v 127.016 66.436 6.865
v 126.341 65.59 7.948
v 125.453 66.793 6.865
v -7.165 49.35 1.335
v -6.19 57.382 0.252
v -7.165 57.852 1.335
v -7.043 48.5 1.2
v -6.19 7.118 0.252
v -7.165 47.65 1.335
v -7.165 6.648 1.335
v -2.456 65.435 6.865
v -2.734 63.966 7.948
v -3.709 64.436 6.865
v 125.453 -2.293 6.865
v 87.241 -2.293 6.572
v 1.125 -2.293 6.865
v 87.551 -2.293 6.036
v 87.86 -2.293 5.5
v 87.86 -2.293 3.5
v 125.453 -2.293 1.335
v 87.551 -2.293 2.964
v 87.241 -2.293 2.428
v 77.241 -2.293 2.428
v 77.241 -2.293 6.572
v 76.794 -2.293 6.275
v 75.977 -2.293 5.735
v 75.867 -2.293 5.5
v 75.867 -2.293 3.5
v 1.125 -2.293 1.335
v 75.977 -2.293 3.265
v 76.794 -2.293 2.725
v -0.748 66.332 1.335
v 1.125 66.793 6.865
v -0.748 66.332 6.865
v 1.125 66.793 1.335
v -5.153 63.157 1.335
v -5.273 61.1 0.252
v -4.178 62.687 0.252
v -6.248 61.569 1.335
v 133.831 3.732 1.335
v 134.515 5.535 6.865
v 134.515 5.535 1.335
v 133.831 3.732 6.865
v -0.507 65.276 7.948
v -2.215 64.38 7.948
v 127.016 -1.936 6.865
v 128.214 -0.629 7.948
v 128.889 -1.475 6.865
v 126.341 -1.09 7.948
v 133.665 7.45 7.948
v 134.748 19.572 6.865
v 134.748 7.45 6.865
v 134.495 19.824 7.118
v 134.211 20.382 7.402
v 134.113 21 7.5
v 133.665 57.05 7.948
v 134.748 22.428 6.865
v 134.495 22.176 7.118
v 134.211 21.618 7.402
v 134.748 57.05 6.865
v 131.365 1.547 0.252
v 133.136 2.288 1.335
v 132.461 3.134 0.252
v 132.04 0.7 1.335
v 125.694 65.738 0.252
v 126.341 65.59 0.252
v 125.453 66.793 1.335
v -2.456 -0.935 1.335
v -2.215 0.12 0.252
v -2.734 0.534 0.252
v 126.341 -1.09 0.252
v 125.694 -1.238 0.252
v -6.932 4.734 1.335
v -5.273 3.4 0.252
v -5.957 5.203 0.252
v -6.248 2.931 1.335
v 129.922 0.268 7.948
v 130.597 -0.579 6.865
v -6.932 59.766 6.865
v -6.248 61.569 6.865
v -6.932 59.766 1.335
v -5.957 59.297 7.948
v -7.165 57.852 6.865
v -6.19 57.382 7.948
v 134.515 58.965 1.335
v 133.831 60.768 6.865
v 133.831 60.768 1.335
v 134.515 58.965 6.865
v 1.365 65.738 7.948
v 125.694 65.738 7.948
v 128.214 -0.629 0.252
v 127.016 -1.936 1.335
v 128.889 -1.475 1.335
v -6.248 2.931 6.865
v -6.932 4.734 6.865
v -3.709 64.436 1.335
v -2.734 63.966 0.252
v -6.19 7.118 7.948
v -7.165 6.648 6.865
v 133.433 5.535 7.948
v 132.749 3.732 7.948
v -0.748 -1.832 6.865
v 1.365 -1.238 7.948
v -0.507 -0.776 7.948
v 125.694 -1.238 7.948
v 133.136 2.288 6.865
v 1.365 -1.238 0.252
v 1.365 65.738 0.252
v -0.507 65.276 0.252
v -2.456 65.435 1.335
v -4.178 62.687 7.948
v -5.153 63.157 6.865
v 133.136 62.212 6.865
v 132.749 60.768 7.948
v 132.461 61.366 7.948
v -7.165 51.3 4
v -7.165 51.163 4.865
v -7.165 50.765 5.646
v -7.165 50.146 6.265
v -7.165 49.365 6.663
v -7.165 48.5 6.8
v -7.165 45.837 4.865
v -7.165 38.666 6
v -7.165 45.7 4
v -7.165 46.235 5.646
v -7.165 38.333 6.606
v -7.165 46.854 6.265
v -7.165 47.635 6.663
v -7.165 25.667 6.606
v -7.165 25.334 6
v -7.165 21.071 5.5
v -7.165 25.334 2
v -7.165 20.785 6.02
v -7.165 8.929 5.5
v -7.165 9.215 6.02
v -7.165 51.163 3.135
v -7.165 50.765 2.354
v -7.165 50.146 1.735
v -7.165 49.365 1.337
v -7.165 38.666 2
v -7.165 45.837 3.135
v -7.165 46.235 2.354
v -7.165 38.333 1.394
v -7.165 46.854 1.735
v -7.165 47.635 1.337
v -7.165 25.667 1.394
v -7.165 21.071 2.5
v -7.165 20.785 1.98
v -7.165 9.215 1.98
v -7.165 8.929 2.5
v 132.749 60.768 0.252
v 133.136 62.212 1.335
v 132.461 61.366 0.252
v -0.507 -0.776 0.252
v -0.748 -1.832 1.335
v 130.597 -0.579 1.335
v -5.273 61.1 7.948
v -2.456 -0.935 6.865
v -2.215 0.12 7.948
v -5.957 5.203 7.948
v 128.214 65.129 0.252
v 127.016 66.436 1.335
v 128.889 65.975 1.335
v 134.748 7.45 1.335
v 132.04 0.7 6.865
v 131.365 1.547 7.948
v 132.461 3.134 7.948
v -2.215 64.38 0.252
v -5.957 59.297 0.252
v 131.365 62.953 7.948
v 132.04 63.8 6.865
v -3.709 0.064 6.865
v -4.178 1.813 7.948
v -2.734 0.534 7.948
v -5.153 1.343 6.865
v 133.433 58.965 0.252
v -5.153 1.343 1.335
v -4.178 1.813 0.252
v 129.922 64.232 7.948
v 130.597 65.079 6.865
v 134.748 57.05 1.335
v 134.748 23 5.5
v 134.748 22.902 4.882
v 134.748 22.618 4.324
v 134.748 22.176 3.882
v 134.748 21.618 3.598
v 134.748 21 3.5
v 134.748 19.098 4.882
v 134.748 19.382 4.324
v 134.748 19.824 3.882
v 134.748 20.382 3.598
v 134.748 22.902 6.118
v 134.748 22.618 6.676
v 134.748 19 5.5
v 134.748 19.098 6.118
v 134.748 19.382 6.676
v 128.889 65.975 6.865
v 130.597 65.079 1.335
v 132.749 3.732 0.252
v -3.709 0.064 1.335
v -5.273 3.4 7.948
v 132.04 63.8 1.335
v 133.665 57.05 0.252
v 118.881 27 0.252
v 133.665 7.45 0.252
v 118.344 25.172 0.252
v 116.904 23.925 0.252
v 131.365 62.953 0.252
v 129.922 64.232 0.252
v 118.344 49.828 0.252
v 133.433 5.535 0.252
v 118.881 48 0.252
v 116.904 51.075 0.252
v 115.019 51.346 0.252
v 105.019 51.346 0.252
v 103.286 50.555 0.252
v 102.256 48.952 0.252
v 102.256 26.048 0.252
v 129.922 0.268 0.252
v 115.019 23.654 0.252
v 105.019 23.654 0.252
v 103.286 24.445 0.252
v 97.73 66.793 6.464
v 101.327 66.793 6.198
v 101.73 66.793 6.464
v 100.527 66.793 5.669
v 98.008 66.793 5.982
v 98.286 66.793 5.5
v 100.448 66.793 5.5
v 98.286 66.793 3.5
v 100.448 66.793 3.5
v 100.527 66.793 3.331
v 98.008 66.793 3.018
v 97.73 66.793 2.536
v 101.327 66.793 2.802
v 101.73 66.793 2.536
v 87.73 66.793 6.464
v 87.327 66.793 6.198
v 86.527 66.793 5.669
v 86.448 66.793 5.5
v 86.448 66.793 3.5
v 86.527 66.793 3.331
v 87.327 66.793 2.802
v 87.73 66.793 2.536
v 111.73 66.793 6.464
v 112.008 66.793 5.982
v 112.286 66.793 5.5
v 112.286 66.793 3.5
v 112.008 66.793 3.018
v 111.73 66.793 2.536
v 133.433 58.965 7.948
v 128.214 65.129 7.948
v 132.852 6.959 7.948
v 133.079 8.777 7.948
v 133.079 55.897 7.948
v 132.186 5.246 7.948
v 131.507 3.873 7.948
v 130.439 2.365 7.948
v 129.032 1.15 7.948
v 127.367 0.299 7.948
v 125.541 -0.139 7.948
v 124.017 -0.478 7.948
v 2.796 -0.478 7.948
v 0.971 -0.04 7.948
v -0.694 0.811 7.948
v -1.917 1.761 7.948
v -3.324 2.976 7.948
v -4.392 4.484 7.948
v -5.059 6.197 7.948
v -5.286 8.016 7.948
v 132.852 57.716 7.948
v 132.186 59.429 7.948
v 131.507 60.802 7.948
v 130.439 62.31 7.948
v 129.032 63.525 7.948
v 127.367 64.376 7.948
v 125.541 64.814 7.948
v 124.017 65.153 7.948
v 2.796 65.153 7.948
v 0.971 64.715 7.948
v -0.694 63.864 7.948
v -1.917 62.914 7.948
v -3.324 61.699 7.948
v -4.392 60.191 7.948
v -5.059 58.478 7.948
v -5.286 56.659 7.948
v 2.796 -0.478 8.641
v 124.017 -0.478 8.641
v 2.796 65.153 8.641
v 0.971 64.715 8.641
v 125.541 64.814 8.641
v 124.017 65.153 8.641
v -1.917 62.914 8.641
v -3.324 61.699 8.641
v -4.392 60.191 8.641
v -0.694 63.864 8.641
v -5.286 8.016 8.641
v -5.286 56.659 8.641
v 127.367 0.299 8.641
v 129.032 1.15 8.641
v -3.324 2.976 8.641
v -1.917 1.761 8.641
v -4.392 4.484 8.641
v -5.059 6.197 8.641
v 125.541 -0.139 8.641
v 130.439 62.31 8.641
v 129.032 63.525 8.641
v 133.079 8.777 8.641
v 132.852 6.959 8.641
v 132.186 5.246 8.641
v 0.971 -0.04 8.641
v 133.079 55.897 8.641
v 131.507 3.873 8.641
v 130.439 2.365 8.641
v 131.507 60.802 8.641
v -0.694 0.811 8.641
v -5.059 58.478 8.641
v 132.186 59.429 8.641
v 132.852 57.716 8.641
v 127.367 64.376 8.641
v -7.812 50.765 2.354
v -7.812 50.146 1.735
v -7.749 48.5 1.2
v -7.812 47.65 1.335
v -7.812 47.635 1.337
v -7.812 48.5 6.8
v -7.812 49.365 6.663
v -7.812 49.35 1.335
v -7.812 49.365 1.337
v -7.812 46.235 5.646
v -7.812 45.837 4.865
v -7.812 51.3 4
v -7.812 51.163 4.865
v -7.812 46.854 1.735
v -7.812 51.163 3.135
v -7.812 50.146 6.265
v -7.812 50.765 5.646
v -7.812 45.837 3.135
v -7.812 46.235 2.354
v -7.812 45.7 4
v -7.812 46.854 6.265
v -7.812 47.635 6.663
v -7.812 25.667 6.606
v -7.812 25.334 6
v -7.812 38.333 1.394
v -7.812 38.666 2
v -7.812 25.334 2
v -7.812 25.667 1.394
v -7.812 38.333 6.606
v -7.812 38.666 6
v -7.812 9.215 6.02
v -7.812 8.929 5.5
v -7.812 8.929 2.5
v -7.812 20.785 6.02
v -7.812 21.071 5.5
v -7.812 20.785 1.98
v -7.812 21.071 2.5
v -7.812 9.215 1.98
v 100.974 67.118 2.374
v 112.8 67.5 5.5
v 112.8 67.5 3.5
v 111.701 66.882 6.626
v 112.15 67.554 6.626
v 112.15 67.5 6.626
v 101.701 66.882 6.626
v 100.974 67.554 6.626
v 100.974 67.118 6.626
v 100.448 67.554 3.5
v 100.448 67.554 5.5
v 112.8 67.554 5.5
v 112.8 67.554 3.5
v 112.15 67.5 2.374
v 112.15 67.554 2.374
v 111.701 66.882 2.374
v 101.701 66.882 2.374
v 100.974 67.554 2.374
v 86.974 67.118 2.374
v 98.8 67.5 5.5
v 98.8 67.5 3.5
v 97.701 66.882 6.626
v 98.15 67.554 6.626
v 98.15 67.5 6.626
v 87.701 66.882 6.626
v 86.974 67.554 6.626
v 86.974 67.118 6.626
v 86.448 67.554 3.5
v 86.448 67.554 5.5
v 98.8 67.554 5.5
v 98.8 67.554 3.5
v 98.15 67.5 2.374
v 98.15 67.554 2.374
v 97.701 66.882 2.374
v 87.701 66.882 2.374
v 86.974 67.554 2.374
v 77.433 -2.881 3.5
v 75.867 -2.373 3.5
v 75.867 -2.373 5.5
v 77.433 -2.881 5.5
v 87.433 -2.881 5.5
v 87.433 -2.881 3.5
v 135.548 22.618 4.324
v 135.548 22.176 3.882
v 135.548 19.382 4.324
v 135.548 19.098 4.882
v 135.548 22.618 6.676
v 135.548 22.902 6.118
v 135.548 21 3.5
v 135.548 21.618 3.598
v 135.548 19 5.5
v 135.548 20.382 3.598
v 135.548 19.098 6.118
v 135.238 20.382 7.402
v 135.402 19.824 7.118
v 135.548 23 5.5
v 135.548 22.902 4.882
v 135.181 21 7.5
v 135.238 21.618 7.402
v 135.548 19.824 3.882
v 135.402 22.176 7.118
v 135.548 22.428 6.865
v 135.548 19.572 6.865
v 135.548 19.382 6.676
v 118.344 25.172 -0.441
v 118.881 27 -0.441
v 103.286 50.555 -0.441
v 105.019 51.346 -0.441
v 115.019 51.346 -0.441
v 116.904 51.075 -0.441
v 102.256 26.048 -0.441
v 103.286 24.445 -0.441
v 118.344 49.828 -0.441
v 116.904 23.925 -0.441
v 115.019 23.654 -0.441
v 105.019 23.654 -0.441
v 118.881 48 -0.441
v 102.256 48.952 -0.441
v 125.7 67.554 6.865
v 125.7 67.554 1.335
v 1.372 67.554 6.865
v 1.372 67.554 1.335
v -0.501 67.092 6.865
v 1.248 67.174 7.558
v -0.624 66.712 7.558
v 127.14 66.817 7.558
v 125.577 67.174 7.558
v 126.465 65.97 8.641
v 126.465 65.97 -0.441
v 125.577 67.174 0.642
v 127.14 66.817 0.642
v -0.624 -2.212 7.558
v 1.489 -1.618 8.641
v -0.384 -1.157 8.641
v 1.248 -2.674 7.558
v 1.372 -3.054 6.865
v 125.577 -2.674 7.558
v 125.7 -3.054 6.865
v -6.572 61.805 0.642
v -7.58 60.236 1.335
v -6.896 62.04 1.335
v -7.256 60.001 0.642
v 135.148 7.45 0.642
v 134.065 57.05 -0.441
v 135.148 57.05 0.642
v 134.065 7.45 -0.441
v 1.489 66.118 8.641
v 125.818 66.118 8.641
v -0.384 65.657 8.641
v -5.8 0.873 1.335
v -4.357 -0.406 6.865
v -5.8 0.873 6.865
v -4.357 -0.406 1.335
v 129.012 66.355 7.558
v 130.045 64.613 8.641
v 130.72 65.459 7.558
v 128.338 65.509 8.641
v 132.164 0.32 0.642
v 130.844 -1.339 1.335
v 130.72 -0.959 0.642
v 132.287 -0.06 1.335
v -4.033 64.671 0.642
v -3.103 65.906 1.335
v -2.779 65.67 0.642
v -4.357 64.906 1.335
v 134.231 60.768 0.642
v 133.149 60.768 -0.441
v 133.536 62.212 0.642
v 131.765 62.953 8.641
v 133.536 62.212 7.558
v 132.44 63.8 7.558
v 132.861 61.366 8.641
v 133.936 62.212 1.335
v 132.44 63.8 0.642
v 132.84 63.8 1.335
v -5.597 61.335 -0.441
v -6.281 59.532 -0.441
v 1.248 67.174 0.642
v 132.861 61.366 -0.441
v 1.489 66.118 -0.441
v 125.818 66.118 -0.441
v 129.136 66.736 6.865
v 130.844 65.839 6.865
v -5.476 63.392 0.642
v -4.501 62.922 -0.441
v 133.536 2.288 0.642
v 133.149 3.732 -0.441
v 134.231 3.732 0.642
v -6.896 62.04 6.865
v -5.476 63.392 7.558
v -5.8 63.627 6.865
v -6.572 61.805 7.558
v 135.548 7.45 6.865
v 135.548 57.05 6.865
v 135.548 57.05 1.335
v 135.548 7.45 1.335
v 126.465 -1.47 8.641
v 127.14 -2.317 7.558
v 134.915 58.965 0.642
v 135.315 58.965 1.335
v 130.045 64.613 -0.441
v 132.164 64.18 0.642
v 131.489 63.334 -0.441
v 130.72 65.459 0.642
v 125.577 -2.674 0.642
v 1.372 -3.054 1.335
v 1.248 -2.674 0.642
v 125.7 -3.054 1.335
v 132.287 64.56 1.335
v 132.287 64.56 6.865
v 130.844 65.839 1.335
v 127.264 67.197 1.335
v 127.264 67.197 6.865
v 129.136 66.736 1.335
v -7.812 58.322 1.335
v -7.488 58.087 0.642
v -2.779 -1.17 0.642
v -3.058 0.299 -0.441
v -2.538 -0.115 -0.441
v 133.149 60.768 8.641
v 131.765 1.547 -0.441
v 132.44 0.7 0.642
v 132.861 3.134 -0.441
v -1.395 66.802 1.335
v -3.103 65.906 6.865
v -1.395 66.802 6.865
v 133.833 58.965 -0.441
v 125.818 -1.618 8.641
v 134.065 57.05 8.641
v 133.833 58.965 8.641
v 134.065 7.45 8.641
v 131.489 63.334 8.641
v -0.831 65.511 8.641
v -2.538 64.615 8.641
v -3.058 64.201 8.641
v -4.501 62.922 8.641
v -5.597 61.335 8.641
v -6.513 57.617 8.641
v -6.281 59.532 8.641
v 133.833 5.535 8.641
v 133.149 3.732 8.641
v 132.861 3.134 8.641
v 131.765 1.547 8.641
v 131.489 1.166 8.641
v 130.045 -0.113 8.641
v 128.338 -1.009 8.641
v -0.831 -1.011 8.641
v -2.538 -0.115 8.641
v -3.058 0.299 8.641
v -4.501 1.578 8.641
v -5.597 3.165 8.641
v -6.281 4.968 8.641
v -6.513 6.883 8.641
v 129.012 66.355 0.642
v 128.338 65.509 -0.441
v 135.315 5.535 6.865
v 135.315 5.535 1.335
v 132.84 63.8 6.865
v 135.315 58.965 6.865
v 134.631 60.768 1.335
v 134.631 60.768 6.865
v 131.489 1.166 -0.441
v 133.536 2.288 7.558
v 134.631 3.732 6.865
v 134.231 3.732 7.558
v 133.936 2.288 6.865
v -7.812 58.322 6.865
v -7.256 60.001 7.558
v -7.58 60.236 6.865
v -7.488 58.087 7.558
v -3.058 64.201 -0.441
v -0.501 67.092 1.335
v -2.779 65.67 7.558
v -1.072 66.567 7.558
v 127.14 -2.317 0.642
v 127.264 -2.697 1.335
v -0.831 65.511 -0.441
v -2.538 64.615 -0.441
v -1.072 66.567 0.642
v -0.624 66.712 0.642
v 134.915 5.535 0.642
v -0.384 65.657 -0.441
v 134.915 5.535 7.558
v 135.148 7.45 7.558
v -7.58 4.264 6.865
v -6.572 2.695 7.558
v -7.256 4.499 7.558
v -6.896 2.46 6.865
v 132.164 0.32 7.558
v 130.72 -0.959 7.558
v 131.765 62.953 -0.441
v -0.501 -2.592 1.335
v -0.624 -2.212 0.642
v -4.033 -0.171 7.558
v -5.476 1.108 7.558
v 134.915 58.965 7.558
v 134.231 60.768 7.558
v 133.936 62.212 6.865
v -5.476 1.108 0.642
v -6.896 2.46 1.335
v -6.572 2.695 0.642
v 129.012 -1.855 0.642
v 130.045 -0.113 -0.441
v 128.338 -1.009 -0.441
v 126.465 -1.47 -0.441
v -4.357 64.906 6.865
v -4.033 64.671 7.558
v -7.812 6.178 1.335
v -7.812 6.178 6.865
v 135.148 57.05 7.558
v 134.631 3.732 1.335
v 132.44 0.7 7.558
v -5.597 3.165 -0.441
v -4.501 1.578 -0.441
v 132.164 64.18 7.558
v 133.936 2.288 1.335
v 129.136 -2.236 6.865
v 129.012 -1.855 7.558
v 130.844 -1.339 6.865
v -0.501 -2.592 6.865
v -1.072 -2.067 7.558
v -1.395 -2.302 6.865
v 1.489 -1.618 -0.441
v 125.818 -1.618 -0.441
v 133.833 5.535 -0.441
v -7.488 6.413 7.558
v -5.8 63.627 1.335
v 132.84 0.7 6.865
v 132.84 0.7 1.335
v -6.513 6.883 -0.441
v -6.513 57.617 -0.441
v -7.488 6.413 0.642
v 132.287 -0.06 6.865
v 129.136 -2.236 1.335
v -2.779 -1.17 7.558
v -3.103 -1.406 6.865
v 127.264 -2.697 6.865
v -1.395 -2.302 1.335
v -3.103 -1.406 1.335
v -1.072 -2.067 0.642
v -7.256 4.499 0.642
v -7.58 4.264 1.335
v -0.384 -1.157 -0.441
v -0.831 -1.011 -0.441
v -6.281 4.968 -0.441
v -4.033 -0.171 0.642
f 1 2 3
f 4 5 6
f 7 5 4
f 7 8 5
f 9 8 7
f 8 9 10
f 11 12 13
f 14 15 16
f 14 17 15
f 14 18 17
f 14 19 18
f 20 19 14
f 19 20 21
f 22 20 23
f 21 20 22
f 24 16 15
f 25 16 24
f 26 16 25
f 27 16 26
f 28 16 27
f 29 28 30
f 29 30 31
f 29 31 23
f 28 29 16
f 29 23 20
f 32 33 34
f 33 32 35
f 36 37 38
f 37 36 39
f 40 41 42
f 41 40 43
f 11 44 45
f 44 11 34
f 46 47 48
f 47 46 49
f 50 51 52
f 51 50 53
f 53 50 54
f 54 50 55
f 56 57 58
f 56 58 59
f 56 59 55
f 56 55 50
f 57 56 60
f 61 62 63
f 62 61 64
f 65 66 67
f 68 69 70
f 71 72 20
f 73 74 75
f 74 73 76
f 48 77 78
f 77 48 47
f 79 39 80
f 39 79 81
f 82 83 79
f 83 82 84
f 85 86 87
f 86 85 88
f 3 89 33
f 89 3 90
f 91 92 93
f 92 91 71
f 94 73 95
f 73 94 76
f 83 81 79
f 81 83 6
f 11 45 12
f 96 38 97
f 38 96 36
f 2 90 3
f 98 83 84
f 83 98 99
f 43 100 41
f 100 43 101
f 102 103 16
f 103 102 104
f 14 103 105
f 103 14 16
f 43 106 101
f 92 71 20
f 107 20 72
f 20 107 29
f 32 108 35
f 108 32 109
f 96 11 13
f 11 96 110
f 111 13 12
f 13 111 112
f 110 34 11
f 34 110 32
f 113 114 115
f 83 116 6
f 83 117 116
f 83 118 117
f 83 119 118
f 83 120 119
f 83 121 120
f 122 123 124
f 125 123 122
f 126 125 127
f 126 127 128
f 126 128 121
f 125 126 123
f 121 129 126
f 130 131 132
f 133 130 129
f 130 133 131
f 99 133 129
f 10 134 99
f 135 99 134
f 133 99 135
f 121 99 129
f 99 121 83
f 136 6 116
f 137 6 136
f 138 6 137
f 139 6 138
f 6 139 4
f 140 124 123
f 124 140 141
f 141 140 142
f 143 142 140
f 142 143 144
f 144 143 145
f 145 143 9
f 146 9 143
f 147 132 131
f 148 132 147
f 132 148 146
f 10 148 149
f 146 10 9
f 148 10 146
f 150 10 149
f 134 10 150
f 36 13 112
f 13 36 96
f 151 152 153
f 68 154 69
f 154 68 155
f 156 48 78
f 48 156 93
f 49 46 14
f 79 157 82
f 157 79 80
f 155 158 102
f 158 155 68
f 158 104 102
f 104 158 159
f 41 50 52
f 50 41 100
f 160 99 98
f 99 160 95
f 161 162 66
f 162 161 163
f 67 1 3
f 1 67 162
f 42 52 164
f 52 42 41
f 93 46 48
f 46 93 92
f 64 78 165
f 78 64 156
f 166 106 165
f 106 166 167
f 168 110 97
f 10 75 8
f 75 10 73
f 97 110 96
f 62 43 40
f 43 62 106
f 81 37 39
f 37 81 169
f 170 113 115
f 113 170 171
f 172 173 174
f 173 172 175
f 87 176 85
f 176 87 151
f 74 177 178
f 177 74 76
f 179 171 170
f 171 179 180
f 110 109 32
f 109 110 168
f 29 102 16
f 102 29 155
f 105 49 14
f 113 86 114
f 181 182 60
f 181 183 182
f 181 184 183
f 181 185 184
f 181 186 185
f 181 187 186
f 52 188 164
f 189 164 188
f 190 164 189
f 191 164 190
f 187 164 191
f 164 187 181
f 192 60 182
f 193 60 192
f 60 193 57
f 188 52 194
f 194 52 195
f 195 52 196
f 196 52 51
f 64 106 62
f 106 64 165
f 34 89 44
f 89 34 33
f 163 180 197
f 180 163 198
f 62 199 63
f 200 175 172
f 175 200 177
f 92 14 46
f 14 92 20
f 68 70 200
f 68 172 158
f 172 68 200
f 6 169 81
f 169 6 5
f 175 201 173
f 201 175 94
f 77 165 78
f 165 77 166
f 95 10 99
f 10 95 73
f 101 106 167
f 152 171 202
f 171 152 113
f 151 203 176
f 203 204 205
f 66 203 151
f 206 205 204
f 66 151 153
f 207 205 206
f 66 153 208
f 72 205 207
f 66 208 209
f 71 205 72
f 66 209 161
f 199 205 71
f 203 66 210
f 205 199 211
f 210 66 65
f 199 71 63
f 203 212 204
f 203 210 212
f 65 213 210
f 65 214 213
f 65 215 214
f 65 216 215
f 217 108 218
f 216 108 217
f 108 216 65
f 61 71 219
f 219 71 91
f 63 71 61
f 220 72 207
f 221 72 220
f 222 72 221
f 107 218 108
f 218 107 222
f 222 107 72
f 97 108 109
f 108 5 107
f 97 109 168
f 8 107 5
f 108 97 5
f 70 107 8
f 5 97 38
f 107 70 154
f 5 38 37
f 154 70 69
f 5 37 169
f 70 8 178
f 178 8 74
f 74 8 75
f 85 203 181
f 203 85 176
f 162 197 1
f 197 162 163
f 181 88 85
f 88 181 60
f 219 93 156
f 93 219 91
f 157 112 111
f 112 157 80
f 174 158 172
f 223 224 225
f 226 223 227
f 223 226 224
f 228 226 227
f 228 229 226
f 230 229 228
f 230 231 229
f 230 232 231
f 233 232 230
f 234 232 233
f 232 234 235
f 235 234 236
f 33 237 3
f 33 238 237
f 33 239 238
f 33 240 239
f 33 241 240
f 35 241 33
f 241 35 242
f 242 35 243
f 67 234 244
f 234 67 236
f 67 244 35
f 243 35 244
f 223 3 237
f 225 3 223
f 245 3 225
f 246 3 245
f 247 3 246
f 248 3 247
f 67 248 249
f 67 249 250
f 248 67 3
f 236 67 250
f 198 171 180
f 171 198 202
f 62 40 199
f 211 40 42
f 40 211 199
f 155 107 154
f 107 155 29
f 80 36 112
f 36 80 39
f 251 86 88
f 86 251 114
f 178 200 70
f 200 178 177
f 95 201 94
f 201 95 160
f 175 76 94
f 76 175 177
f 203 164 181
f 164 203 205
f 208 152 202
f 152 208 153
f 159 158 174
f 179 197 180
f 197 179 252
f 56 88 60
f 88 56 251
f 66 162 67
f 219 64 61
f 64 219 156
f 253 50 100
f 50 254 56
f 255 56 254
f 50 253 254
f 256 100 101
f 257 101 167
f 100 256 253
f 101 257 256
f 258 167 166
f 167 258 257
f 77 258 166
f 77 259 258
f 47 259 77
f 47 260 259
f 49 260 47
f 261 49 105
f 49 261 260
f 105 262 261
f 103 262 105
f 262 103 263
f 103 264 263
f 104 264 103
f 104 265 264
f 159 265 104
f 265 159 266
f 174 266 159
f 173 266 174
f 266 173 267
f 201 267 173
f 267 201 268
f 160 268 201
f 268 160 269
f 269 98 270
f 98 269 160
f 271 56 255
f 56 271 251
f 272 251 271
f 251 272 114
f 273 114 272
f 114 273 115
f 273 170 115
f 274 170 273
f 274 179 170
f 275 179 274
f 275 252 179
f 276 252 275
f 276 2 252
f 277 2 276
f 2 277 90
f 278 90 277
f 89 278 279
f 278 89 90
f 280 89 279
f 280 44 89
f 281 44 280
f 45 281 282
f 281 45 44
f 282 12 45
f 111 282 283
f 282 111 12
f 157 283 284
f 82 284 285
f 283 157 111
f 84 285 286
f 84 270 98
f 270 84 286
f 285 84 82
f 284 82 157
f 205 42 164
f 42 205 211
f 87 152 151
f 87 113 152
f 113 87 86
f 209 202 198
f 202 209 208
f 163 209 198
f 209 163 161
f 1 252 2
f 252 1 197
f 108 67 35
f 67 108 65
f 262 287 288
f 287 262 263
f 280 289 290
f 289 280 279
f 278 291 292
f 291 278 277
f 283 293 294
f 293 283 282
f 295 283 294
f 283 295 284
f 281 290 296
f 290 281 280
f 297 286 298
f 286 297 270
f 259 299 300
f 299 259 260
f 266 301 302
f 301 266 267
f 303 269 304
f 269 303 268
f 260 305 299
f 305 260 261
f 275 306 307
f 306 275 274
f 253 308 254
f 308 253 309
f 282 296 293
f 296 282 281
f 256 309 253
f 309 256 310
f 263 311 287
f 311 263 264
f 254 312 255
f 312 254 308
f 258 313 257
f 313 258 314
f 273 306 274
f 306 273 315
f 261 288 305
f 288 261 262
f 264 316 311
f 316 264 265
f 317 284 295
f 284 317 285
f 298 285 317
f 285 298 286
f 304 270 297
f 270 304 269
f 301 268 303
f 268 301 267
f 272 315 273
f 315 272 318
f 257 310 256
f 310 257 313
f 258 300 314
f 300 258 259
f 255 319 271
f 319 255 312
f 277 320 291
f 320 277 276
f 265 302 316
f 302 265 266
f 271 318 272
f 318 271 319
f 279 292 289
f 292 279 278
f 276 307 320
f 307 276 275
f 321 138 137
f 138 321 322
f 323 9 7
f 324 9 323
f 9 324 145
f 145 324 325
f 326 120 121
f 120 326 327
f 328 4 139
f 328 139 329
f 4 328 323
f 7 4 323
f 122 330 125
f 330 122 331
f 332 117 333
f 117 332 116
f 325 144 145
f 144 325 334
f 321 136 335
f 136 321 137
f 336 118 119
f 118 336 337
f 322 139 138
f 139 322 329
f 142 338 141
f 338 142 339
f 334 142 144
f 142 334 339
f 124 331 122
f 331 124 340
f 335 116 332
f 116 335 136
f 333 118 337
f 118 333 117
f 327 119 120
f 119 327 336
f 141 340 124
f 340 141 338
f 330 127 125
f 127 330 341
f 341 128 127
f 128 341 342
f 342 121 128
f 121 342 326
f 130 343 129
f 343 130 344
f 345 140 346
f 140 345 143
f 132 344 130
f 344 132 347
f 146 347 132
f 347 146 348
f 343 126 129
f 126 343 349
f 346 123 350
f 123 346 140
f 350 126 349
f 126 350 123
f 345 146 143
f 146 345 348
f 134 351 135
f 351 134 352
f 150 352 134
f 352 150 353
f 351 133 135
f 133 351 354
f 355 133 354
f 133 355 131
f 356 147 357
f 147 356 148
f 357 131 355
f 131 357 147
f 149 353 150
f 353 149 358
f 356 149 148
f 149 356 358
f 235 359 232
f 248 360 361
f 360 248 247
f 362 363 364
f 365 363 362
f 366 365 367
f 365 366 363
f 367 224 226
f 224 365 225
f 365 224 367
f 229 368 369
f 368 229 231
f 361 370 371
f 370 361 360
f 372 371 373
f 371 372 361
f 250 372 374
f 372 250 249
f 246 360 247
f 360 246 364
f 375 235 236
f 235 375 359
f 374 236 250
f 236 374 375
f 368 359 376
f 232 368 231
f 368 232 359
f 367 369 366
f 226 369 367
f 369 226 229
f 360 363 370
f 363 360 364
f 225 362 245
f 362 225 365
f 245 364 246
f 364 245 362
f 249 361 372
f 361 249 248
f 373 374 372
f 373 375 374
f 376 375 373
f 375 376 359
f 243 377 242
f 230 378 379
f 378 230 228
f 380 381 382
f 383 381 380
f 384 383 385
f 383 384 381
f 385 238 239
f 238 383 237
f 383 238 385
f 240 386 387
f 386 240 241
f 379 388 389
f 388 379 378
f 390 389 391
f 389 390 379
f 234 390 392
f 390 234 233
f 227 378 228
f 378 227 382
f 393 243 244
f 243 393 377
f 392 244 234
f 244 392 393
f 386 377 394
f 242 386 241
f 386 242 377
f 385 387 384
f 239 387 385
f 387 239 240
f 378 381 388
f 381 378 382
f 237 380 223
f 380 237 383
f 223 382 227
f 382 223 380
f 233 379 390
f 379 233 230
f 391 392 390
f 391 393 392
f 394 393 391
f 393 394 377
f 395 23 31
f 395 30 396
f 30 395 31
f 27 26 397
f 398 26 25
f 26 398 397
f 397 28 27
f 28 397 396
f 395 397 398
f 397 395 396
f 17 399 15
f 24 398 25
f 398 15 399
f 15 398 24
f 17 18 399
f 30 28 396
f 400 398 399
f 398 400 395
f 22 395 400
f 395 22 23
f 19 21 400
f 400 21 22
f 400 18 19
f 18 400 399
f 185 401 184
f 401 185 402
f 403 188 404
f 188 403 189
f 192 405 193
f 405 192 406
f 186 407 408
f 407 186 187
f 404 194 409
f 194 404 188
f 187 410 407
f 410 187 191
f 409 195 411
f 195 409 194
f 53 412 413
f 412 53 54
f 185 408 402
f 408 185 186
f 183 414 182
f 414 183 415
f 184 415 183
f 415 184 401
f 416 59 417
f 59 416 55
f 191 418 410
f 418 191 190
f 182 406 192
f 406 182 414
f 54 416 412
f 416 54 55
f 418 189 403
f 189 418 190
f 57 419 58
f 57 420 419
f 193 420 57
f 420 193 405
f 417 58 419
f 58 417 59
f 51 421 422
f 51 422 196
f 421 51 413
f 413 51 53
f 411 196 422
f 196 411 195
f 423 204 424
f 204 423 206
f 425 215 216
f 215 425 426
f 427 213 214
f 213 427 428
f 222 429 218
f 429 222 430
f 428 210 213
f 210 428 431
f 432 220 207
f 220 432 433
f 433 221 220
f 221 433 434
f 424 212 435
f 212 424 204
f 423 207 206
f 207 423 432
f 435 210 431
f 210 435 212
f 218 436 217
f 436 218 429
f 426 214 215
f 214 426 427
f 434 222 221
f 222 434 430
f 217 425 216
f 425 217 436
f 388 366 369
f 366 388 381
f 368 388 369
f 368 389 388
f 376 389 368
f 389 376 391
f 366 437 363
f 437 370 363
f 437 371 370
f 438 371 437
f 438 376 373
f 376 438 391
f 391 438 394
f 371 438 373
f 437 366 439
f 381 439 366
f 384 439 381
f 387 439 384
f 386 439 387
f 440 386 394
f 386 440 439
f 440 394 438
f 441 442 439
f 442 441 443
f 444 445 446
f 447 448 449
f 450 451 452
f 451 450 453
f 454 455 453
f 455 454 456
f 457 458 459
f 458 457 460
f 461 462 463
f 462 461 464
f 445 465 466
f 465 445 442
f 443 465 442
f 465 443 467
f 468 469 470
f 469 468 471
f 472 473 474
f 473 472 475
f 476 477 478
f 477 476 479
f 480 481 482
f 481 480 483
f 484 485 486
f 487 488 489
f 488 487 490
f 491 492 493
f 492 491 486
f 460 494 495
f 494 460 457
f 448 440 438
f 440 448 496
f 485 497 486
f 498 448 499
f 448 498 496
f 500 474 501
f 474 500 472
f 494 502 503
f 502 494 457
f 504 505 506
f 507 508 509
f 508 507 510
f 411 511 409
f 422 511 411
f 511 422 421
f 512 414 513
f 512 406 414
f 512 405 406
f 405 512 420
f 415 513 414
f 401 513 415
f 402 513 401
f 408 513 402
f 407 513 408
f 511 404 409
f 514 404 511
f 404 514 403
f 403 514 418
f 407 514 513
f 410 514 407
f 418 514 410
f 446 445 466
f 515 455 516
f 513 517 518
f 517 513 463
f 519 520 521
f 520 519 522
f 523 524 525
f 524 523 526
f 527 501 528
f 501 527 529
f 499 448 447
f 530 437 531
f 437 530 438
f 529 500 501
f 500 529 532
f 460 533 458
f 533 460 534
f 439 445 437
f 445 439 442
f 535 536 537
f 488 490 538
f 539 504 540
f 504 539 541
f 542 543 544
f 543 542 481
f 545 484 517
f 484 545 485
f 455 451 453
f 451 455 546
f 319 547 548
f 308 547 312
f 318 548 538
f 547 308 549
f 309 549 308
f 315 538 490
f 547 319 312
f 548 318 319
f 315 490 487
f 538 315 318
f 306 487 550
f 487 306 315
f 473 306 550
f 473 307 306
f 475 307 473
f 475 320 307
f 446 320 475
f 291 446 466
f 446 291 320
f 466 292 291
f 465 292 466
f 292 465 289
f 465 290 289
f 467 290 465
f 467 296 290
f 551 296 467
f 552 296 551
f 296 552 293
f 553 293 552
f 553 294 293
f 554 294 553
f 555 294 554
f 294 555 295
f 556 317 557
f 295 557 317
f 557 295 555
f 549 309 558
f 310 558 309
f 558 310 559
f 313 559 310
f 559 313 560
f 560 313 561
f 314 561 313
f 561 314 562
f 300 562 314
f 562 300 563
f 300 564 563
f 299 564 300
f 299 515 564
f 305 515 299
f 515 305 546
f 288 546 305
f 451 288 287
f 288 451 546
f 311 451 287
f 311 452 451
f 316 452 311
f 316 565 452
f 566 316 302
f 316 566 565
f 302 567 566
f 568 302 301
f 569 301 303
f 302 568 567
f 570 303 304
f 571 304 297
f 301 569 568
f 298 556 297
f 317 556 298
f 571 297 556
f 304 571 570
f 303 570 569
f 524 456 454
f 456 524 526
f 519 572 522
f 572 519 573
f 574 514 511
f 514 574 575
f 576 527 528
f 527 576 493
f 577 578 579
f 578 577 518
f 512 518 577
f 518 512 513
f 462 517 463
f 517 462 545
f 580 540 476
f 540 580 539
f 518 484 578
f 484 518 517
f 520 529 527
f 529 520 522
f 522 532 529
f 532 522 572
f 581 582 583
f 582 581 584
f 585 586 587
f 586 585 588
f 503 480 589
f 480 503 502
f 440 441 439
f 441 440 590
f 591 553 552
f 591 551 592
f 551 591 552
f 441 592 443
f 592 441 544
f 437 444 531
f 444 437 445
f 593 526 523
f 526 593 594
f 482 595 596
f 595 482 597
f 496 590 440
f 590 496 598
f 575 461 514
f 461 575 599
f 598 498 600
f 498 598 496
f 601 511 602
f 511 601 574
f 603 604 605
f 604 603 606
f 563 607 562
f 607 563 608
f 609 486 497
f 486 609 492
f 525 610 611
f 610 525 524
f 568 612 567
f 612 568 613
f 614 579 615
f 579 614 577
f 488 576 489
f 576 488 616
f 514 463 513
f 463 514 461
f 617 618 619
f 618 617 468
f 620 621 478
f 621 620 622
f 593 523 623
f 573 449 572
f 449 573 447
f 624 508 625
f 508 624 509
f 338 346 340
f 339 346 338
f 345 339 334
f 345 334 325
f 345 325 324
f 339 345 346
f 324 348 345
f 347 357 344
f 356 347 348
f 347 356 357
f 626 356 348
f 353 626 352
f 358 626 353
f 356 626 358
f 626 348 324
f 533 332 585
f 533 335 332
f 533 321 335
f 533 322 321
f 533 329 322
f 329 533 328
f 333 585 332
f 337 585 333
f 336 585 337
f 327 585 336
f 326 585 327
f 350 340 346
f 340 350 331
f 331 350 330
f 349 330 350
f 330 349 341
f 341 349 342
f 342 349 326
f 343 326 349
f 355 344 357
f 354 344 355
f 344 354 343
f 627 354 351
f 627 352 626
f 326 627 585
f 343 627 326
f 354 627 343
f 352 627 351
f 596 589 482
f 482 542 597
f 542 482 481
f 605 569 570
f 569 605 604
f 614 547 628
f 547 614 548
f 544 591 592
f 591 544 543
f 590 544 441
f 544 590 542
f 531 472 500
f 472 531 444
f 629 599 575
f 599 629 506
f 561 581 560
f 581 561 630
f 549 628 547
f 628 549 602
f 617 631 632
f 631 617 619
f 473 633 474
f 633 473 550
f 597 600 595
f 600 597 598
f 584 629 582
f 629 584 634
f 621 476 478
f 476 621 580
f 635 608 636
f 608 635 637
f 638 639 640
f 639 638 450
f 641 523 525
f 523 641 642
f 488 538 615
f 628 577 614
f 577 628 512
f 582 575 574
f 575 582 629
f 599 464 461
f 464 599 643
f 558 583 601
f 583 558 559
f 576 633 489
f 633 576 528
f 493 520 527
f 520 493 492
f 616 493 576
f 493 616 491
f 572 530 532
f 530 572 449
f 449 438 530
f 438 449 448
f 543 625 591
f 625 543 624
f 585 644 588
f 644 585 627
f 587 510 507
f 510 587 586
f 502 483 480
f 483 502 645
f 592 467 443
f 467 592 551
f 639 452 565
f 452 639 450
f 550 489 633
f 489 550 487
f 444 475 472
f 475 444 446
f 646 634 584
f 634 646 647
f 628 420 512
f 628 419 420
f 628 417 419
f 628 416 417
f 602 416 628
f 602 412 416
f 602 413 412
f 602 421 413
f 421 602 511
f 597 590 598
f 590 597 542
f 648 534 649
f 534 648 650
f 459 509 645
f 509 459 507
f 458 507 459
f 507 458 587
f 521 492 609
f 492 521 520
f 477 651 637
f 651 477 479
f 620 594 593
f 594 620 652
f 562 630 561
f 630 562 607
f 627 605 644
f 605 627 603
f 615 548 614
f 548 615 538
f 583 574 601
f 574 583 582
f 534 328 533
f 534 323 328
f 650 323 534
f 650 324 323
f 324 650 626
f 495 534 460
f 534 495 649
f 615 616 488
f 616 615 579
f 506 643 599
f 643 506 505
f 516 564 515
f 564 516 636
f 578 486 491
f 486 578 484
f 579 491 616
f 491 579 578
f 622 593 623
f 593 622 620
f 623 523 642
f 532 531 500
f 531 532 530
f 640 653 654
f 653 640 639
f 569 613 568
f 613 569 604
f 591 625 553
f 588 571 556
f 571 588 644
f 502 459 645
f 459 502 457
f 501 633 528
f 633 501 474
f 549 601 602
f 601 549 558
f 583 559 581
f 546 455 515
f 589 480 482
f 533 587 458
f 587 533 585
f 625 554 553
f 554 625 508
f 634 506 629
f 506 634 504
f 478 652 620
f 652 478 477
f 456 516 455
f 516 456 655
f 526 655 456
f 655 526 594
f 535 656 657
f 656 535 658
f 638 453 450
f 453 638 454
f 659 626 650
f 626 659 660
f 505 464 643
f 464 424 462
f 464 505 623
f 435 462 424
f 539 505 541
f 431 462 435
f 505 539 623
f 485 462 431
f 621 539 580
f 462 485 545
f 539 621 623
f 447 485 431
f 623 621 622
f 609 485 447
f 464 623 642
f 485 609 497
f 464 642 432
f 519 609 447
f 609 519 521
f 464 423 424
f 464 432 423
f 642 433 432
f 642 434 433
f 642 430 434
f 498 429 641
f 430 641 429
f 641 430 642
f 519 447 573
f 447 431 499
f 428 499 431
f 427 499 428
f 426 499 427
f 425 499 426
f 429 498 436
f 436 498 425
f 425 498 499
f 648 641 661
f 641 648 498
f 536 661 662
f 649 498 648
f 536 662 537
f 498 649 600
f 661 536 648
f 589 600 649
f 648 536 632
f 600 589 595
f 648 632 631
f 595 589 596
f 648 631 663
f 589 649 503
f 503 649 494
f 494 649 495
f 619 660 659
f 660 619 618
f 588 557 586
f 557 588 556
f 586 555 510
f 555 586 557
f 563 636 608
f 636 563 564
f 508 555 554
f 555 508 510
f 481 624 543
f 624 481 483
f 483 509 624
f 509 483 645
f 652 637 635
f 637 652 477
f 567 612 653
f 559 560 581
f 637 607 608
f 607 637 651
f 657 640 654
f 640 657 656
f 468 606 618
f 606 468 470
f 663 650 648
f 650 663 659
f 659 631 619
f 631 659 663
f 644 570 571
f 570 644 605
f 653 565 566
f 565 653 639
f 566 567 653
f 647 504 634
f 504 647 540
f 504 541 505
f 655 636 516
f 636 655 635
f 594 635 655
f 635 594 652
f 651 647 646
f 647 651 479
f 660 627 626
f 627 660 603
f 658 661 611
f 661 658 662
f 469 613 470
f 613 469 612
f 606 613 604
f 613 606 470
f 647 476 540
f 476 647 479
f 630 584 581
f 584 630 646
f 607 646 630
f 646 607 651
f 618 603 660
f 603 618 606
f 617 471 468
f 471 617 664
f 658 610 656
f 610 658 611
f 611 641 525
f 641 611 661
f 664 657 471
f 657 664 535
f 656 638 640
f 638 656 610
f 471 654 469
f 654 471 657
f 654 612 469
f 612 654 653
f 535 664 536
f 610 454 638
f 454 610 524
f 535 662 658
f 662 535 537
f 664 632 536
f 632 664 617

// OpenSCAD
$bottom=45;
$rotation=-90;
$text1size=10;
$text1="";
$linespace=-20;
$text2size=10;
$text2 ="";

module samsung() {
    minkowski() {
        translate([2.5,7.45,2.1]) cube([122.4,49.6,3.5]);
        translate([0,0,0]) cylinder(r=8, h=.5);
        sphere(r=2);
    }
}
module  slogan() {
    translate([$bottom,32,1])
    rotate (a=[0,180,-$rotation]) 
    linear_extrude(3) union() {
        text($text1, halign="center", size=$text1size);
        translate([0,$linespace,0])
            text($text2, halign="center", size=$text2size, font="verdana" );
    }
}

difference() {
    union() {
        //case
        color("green") minkowski() {
            samsung();
            sphere(r=0.8);
        }
//        //volume buttons
//        translate([106.5,65,4.5]) color("blue") minkowski() {
//            cube([10,5,1], center=true);
//            sphere(r=1);
//        }   
//        translate([92.5,65,4.5]) color("blue") minkowski() {
//            cube([10,5,1], center=true);
//            sphere(r=1);
//        }   
//        //power button
//        translate([82,-.6,4.5]) color("blue") minkowski() {
//            cube([10,5,1], center=true);
//            sphere(r=1);
//        }   
    }
    slogan();
    union() {
        // inside
        samsung();
        // screen opening
        translate([1.7,1.7,5]) scale([.975,.95,1]) samsung();
        // headphone opening
        rotate([0,90,0]) translate([-4,48.5,0]) cylinder(r=2.8,h=20,$fn=20, center=true);
        // buttom openings
        translate([-10,32,4]) color("red") minkowski() {
            cube([10,12,4], center=true);
            sphere(r=0.7);
        }
        translate([-10,15,4]) color("red") minkowski() {
            cube([7,11,3], center=true);
            sphere(r=0.6);
        }
        // volume buttons inner
        translate([106.5,70,4.5]) color("blue") minkowski() {
            cube([10,5,2], center=true);
            sphere(r=1.3);
        }   
        translate([92.5,70,4.5]) color("blue") minkowski() {
            cube([10,5,2], center=true);
            sphere(r=1.3);
        }   

        // power button inner
        translate([82,.95,4.5]) color("blue") minkowski() {
            cube([10,5,2], center=true);
            sphere(r=1.4);
        }   

        // top mic opening
        rotate([0,90,0]) translate([-5.5,21,135]) cylinder(r=2,h=20,$fn=20, center=true);    
        // camera opening
        translate([110.5,37.5,-5]) color("yellow") minkowski() {
            cube([10,21,10], center=true);
            sphere(r=3.5);
        }
    }   
}
